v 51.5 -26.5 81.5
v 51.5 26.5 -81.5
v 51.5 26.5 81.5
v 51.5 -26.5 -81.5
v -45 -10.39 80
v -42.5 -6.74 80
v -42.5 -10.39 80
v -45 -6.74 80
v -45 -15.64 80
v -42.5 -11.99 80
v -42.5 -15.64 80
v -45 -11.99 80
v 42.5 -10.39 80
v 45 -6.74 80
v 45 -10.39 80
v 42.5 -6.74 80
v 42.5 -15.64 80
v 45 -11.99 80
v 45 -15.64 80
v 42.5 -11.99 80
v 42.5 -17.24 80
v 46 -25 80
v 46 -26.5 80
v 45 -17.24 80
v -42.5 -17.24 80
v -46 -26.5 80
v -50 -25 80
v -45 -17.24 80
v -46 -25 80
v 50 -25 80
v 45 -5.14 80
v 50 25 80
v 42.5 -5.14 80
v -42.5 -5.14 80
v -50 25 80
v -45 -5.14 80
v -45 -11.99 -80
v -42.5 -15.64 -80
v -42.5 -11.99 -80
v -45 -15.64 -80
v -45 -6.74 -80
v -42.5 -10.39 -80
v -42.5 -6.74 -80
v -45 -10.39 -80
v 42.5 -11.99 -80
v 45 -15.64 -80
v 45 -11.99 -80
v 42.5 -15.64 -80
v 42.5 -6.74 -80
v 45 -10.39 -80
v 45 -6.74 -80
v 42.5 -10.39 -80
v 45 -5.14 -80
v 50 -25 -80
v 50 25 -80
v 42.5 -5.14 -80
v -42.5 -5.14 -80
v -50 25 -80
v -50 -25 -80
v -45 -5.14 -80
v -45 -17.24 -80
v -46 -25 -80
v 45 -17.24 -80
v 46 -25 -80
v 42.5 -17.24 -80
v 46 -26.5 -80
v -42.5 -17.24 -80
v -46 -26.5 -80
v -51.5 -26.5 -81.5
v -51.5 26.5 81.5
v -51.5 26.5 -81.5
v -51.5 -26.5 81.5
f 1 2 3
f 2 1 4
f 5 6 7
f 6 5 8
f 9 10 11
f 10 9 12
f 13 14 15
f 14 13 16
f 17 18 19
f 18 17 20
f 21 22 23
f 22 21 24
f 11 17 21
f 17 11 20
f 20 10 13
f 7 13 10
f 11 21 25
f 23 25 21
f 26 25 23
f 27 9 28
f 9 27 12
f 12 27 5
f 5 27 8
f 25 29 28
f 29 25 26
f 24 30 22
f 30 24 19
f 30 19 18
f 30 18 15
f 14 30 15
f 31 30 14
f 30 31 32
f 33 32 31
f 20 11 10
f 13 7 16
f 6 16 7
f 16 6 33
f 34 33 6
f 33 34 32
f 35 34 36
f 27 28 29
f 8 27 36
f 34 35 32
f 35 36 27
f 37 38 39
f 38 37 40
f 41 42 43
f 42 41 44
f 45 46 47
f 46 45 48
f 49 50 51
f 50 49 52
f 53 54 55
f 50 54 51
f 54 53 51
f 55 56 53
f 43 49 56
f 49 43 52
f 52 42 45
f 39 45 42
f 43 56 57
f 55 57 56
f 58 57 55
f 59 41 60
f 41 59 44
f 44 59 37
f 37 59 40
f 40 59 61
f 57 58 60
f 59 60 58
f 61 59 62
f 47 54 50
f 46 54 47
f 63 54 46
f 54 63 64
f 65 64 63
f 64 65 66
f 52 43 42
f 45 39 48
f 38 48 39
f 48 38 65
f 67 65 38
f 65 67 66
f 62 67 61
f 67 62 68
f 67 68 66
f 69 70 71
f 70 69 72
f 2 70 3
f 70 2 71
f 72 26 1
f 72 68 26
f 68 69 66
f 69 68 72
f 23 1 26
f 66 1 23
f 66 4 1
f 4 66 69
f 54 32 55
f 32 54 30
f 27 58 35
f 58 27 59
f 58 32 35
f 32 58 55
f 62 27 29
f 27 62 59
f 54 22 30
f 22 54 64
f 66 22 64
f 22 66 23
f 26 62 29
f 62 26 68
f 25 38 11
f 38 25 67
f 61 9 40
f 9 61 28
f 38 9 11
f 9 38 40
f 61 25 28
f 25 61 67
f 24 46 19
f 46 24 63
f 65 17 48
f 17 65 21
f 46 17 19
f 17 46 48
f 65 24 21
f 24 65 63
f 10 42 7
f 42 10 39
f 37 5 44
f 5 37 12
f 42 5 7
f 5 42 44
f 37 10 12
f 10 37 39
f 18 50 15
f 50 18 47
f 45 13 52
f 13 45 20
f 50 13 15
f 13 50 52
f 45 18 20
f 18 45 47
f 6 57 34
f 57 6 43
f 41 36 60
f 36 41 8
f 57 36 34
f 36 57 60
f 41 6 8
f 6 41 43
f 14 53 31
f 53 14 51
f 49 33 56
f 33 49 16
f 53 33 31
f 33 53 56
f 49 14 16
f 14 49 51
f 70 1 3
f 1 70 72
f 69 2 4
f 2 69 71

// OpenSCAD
// Simplified parametric Hammond 1455 series case
// Dimensions from datasheet + measured from 1455L cross-section
//
// Usage:
//   openscad -o 1455N1601.stl -D 'profile="N"' -D 'length=160' 1455-case.scad

// Parameters
profile = "N";  // J=27, K=43, L=30.5, N=53, P=30.5(125w), T=51.5(165w)
length  = 160;  // body length in mm

// Profile dimensions (width x depth)
function profile_dims(p) =
    p == "J" ? [78, 27] :
    p == "K" ? [78, 43] :
    p == "L" ? [103, 30.5] :
    p == "N" ? [103, 53] :
    p == "T" ? [165, 51.5] :
    [103, 53];  // default N

dims = profile_dims(profile);
width = dims[0];
depth = dims[1];

// Common dimensions (from cross-section analysis of 1455L)
wall = 1.5;           // wall thickness
slot_width = 1.6;     // PCB slot width (fits 1.6mm board)
slot_depth = 2.5;     // how far slot protrudes from inner wall
slot_inset = 5.0;     // slot rail starts this far from side wall (inner)

// Belly plate groove
belly_width = width - 2*5.5;  // ~91.9 for 103mm wide
belly_depth = 4.2;            // groove depth at bottom

// PCB slot positions (measured from INNER bottom)
// These are the same for all 103mm-wide profiles (L, N)
// For the 1455N (53mm deep), slots are near the top (lid side)
// The profile is NOT symmetric - slots are only on the lid side
// From outer bottom: slot centers at 10.06, 15.31, 20.56mm
// From inner bottom (subtract wall): 8.56, 13.81, 19.06mm
slot_from_inner_bottom = [8.56, 13.81, 19.06];

$fn = 32;

module case_body() {
    inner_w = width - 2*wall;
    inner_d = depth - 2*wall;

    difference() {
        // Outer shell
        cube([width, depth, length], center=true);

        // Hollow interior
        cube([inner_w, inner_d, length + 1], center=true);

        // Belly plate groove (bottom)
        translate([0, -depth/2 + belly_depth/2, 0])
            cube([belly_width, belly_depth + 0.1, length + 1], center=true);
    }

    // PCB card slot rails (both sides)
    for (slot_y = slot_from_inner_bottom) {
        y_pos = -depth/2 + wall + slot_y;
        for (side = [-1, 1]) {
            x_pos = side * (width/2 - wall - slot_inset - slot_depth/2);
            translate([x_pos, y_pos, 0])
                cube([slot_depth, slot_width, length], center=true);
        }
    }
}

module end_plate() {
    // Simple flat aluminium end plate
    plate_t = 1.5;
    translate([0, 0, length/2 + plate_t/2])
        cube([width, depth, plate_t], center=true);
}

// Render
case_body();
end_plate();
mirror([0, 0, 1]) end_plate();
